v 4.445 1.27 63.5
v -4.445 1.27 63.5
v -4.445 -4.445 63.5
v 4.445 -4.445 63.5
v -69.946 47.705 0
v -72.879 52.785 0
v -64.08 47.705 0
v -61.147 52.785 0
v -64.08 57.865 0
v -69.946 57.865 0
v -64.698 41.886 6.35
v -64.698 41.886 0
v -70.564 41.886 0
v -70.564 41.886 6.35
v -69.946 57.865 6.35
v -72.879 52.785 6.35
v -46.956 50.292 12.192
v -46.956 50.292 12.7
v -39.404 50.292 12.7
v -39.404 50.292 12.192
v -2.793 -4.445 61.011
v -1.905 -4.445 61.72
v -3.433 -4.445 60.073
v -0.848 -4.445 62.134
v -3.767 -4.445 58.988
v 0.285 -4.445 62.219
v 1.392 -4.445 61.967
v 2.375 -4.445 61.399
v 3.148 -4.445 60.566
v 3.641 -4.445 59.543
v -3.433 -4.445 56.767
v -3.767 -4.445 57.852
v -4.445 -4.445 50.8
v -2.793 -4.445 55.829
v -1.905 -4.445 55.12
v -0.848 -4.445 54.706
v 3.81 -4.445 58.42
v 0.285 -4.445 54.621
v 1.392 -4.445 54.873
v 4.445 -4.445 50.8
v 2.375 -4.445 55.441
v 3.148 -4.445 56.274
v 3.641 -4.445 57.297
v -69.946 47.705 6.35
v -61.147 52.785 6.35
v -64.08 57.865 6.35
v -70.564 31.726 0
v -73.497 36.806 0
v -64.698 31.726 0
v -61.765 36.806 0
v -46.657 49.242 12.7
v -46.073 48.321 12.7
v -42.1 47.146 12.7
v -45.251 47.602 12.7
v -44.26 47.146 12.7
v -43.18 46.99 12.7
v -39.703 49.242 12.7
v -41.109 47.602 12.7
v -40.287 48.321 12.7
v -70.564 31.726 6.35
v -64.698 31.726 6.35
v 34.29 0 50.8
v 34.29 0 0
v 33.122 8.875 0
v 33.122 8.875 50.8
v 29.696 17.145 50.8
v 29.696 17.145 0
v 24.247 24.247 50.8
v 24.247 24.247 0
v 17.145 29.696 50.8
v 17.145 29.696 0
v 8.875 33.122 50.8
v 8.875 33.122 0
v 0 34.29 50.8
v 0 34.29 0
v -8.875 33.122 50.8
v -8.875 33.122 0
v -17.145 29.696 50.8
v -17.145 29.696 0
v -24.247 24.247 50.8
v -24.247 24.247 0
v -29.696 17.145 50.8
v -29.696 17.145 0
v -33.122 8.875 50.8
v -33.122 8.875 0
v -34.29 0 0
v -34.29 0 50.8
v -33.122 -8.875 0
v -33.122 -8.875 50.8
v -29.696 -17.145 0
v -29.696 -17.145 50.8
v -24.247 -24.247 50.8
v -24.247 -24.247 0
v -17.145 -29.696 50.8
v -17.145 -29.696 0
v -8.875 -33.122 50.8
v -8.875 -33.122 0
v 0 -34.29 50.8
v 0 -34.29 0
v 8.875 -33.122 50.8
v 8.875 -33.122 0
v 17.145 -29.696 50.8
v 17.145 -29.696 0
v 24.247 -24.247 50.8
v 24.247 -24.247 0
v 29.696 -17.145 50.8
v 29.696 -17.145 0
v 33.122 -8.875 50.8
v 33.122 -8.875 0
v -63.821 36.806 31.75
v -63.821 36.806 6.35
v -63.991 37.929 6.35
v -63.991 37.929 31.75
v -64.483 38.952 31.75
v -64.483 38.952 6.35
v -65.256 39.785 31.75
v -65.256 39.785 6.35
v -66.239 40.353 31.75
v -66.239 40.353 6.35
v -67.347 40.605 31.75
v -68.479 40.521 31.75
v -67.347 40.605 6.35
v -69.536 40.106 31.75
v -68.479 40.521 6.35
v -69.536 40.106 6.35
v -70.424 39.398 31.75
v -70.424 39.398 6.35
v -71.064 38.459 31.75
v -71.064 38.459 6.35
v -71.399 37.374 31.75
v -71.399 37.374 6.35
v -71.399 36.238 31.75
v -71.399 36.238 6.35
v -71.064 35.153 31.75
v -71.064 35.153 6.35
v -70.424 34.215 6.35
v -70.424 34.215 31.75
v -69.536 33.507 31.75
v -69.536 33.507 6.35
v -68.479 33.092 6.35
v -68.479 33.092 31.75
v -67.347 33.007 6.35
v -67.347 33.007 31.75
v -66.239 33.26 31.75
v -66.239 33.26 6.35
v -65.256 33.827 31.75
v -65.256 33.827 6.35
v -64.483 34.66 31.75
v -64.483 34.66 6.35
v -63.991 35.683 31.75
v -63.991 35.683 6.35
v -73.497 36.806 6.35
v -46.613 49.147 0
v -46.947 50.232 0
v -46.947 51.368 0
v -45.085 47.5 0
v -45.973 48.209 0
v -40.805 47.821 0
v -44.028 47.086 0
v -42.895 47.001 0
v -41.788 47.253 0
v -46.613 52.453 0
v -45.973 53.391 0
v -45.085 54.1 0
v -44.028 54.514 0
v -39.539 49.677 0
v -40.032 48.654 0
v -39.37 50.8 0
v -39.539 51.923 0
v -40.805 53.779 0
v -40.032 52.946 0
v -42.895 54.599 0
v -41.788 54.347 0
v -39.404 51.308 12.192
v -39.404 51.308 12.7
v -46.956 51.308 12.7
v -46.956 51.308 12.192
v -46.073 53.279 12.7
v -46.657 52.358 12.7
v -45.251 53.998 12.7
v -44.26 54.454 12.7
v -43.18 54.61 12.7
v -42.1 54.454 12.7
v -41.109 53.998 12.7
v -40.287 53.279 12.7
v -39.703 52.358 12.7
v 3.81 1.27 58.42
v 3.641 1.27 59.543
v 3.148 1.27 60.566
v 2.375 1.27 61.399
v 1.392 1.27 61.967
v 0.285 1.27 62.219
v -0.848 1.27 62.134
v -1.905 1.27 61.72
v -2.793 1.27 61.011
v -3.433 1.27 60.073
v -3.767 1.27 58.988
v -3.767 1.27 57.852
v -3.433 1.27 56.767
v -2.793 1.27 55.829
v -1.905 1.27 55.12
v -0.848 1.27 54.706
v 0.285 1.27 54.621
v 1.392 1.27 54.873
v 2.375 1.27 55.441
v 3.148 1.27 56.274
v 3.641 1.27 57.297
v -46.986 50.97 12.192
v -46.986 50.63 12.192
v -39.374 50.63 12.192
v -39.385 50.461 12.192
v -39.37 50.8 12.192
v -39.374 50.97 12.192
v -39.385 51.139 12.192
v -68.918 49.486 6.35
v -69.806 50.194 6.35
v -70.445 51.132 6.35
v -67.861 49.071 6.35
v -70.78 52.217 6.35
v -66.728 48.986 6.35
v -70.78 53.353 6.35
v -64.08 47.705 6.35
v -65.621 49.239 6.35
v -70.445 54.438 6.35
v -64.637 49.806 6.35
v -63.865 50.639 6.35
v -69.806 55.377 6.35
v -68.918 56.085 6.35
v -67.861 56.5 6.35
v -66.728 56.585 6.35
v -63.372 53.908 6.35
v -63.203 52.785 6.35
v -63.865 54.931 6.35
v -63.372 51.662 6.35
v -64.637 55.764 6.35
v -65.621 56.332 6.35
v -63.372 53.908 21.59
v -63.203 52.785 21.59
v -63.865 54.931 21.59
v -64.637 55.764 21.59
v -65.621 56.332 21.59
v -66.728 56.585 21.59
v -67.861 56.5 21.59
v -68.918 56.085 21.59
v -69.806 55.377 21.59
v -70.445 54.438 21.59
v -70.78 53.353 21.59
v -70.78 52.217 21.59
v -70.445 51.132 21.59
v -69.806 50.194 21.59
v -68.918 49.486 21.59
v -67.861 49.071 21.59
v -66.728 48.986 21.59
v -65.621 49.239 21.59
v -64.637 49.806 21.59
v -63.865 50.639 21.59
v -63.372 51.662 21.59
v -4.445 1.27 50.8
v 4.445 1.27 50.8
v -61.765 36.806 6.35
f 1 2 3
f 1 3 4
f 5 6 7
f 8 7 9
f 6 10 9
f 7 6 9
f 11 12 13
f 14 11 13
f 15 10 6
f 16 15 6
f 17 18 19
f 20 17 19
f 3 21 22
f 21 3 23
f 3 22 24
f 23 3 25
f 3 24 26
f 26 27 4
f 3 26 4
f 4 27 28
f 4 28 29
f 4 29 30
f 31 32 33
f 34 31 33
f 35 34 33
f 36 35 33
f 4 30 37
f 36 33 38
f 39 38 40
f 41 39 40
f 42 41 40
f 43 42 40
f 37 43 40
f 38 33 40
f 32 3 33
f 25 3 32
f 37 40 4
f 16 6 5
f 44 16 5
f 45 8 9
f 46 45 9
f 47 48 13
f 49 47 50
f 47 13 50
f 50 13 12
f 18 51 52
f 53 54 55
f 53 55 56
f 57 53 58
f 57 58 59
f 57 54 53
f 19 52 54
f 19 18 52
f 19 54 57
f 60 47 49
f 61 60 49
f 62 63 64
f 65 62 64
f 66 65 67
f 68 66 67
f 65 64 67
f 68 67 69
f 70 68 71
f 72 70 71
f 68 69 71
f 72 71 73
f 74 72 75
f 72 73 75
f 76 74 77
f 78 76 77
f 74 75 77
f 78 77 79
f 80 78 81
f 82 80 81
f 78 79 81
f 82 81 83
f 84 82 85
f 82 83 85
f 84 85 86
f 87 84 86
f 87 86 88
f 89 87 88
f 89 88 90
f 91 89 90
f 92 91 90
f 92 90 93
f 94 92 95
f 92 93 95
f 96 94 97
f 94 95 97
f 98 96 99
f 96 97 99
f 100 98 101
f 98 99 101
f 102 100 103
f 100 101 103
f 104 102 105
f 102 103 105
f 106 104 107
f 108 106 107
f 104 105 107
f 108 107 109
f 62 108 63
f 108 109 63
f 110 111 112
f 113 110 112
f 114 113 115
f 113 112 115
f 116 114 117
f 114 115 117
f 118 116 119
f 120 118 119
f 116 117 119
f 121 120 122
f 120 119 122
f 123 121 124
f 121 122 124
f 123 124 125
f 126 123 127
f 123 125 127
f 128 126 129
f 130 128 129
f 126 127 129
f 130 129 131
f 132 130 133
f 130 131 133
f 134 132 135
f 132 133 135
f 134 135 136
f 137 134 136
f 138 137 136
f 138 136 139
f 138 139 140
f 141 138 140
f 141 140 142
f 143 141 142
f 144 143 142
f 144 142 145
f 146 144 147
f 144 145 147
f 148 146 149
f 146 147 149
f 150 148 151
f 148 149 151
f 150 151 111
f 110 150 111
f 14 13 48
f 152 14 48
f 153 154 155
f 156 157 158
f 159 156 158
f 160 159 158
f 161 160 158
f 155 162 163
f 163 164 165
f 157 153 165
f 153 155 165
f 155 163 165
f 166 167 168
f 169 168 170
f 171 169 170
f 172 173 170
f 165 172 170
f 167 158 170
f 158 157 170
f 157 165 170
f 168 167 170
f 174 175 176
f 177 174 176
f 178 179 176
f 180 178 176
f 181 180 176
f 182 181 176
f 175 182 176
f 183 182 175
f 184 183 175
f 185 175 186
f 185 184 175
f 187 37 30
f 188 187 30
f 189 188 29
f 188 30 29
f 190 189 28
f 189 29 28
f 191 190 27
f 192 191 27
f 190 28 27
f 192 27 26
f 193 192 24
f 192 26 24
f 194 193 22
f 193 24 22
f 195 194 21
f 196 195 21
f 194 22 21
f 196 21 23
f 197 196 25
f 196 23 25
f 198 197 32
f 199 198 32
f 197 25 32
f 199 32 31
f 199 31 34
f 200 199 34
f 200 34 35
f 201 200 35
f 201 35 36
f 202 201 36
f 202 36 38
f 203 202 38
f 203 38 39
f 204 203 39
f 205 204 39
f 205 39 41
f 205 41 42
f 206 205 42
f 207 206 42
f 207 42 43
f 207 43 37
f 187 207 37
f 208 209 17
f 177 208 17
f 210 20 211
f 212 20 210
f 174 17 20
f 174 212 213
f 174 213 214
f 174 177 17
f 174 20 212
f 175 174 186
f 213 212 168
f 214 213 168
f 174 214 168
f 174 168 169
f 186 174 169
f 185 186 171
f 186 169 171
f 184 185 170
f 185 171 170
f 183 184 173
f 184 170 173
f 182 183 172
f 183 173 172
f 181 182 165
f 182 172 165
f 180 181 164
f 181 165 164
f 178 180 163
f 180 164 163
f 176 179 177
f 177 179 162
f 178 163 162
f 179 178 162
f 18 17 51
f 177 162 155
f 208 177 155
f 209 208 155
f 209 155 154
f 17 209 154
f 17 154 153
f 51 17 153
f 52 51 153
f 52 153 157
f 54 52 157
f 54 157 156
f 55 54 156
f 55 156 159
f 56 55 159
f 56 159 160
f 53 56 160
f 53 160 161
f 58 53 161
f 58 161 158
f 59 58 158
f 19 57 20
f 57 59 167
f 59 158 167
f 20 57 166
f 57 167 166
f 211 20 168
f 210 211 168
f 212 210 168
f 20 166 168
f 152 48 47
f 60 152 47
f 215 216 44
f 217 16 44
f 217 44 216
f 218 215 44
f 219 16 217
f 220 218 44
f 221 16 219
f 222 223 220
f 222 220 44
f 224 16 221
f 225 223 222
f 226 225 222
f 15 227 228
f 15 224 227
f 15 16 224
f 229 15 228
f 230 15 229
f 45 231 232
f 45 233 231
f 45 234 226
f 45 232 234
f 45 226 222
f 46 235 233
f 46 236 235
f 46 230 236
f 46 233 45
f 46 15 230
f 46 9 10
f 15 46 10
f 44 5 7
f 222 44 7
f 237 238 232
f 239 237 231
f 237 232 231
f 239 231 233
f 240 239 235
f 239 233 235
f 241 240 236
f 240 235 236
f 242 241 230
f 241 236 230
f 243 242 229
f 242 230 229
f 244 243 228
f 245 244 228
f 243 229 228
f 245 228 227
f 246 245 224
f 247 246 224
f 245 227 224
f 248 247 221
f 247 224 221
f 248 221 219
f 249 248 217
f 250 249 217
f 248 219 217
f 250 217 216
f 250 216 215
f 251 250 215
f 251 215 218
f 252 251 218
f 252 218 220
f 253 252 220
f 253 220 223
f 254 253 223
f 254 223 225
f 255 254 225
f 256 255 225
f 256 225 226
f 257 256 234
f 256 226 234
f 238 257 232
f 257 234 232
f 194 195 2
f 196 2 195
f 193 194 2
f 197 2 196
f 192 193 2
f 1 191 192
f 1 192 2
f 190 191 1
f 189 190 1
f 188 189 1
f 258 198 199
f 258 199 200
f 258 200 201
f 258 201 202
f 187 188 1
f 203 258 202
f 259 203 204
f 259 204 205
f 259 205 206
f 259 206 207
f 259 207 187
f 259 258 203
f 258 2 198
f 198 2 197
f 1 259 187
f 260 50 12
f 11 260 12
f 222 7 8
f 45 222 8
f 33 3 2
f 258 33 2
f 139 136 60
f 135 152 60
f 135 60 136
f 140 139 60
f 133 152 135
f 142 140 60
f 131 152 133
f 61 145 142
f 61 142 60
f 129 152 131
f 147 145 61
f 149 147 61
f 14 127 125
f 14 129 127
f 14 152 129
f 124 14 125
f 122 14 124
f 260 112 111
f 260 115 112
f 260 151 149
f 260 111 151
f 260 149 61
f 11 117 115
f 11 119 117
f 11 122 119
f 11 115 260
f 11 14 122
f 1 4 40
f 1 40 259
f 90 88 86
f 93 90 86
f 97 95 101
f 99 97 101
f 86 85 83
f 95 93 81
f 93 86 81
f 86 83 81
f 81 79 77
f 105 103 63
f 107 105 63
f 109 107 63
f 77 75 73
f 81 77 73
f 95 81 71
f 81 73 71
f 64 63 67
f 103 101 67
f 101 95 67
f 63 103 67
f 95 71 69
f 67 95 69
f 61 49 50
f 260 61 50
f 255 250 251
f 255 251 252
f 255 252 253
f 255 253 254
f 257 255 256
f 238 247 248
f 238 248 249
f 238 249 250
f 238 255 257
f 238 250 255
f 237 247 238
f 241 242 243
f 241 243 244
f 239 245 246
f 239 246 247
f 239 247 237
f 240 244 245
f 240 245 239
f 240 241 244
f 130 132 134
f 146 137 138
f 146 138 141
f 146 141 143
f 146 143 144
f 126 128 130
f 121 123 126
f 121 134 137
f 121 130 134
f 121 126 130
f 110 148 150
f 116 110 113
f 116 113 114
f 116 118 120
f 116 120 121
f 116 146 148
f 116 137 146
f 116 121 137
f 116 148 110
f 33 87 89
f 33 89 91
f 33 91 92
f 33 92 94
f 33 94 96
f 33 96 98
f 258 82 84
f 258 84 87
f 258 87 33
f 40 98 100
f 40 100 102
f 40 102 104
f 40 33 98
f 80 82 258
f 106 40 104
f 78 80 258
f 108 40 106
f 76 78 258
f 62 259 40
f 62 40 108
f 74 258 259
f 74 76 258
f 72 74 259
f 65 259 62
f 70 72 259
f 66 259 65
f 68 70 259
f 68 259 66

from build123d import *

# Parameters (mm, degrees)
F0_R      = 34.29
F1_DEPTH  = 50.8
F2_W      = 8.89
F2_H      = 5.715
F3_DEPTH  = 12.7
F4_R      = 3.81
F5_DEPTH  = 25.4
F7_DEPTH  = 6.35
F8_R      = 3.81
F9_DEPTH  = 15.24
F10_R     = 3.81
F11_DEPTH = 12.7
F13_DEPTH = 0.508
F15_DEPTH = 6.35
F16_R     = 3.81
F17_DEPTH = 25.4


with BuildPart() as f1:
    # F0 (on Top) → F1 (new body)
    with BuildSketch(Plane.XY):
        Circle(F0_R)
    extrude(amount=F1_DEPTH)

    # F2 (on face) → F3 (join)
    with BuildSketch(Plane.XY.offset(50.8)):
        with Locations((0, -1.5875)):
            Rectangle(F2_W, F2_H)
    extrude(amount=F3_DEPTH)

    # F4 (on face) → F5 (cut)
    with BuildSketch(Plane.XZ.offset(4.445)):
        with Locations((0, 58.42)):
            Circle(F4_R)
    extrude(amount=-F5_DEPTH, mode=Mode.SUBTRACT)


with BuildPart() as f7:
    # F6 (on Top) → F7 (new body)
    with BuildSketch(Plane.XY):
        Polygon((-69.9456740787, 47.7052103114), (-64.0797953437, 47.7052103114), (-61.1468559762, 52.7852103114), (-64.0797953437, 57.8652103114), (-69.9456740787, 57.8652103114), (-72.8786134461, 52.7852103114), align=None)
    extrude(amount=F7_DEPTH)

    # F8 (on face) → F9 (join)
    with BuildSketch(Plane.XY.offset(6.35)):
        with Locations((-67.0127347112, 52.7852103114)):
            Circle(F8_R)
    extrude(amount=F9_DEPTH)


with BuildPart() as f11:
    # F10 (on Top) → F11 (new body)
    with BuildSketch(Plane.XY):
        with Locations((-43.18, 50.8)):
            Circle(F10_R)
    extrude(amount=F11_DEPTH)

    # F12 (on face) → F13 (cut)
    with BuildSketch(Plane.XY.offset(12.7)):
        with BuildLine():
            ThreePointArc((-46.9559814618, 51.308), (-46.99, 50.8), (-46.9559814618, 50.292))
            Line((-46.9559814618, 50.292), (-39.4040185382, 50.292))
            ThreePointArc((-39.4040185382, 50.292), (-39.37, 50.8), (-39.4040185382, 51.308))
            Line((-39.4040185382, 51.308), (-46.9559814618, 51.308))
        make_face()
    extrude(amount=-F13_DEPTH, mode=Mode.SUBTRACT)


with BuildPart() as f15:
    # F14 (on Top) → F15 (new body)
    with BuildSketch(Plane.XY):
        Polygon((-70.5642212798, 31.7261475456), (-64.6983425448, 31.7261475456), (-61.7654031774, 36.8061475456), (-64.6983425448, 41.8861475456), (-70.5642212798, 41.8861475456), (-73.4971606473, 36.8061475456), align=None)
    extrude(amount=F15_DEPTH)

    # F16 (on face) → F17 (join)
    with BuildSketch(Plane.XY.offset(6.35)):
        with Locations((-67.6312819123, 36.8061475456)):
            Circle(F16_R)
    extrude(amount=F17_DEPTH)


solid = Compound([f1.part, f7.part, f11.part, f15.part])
